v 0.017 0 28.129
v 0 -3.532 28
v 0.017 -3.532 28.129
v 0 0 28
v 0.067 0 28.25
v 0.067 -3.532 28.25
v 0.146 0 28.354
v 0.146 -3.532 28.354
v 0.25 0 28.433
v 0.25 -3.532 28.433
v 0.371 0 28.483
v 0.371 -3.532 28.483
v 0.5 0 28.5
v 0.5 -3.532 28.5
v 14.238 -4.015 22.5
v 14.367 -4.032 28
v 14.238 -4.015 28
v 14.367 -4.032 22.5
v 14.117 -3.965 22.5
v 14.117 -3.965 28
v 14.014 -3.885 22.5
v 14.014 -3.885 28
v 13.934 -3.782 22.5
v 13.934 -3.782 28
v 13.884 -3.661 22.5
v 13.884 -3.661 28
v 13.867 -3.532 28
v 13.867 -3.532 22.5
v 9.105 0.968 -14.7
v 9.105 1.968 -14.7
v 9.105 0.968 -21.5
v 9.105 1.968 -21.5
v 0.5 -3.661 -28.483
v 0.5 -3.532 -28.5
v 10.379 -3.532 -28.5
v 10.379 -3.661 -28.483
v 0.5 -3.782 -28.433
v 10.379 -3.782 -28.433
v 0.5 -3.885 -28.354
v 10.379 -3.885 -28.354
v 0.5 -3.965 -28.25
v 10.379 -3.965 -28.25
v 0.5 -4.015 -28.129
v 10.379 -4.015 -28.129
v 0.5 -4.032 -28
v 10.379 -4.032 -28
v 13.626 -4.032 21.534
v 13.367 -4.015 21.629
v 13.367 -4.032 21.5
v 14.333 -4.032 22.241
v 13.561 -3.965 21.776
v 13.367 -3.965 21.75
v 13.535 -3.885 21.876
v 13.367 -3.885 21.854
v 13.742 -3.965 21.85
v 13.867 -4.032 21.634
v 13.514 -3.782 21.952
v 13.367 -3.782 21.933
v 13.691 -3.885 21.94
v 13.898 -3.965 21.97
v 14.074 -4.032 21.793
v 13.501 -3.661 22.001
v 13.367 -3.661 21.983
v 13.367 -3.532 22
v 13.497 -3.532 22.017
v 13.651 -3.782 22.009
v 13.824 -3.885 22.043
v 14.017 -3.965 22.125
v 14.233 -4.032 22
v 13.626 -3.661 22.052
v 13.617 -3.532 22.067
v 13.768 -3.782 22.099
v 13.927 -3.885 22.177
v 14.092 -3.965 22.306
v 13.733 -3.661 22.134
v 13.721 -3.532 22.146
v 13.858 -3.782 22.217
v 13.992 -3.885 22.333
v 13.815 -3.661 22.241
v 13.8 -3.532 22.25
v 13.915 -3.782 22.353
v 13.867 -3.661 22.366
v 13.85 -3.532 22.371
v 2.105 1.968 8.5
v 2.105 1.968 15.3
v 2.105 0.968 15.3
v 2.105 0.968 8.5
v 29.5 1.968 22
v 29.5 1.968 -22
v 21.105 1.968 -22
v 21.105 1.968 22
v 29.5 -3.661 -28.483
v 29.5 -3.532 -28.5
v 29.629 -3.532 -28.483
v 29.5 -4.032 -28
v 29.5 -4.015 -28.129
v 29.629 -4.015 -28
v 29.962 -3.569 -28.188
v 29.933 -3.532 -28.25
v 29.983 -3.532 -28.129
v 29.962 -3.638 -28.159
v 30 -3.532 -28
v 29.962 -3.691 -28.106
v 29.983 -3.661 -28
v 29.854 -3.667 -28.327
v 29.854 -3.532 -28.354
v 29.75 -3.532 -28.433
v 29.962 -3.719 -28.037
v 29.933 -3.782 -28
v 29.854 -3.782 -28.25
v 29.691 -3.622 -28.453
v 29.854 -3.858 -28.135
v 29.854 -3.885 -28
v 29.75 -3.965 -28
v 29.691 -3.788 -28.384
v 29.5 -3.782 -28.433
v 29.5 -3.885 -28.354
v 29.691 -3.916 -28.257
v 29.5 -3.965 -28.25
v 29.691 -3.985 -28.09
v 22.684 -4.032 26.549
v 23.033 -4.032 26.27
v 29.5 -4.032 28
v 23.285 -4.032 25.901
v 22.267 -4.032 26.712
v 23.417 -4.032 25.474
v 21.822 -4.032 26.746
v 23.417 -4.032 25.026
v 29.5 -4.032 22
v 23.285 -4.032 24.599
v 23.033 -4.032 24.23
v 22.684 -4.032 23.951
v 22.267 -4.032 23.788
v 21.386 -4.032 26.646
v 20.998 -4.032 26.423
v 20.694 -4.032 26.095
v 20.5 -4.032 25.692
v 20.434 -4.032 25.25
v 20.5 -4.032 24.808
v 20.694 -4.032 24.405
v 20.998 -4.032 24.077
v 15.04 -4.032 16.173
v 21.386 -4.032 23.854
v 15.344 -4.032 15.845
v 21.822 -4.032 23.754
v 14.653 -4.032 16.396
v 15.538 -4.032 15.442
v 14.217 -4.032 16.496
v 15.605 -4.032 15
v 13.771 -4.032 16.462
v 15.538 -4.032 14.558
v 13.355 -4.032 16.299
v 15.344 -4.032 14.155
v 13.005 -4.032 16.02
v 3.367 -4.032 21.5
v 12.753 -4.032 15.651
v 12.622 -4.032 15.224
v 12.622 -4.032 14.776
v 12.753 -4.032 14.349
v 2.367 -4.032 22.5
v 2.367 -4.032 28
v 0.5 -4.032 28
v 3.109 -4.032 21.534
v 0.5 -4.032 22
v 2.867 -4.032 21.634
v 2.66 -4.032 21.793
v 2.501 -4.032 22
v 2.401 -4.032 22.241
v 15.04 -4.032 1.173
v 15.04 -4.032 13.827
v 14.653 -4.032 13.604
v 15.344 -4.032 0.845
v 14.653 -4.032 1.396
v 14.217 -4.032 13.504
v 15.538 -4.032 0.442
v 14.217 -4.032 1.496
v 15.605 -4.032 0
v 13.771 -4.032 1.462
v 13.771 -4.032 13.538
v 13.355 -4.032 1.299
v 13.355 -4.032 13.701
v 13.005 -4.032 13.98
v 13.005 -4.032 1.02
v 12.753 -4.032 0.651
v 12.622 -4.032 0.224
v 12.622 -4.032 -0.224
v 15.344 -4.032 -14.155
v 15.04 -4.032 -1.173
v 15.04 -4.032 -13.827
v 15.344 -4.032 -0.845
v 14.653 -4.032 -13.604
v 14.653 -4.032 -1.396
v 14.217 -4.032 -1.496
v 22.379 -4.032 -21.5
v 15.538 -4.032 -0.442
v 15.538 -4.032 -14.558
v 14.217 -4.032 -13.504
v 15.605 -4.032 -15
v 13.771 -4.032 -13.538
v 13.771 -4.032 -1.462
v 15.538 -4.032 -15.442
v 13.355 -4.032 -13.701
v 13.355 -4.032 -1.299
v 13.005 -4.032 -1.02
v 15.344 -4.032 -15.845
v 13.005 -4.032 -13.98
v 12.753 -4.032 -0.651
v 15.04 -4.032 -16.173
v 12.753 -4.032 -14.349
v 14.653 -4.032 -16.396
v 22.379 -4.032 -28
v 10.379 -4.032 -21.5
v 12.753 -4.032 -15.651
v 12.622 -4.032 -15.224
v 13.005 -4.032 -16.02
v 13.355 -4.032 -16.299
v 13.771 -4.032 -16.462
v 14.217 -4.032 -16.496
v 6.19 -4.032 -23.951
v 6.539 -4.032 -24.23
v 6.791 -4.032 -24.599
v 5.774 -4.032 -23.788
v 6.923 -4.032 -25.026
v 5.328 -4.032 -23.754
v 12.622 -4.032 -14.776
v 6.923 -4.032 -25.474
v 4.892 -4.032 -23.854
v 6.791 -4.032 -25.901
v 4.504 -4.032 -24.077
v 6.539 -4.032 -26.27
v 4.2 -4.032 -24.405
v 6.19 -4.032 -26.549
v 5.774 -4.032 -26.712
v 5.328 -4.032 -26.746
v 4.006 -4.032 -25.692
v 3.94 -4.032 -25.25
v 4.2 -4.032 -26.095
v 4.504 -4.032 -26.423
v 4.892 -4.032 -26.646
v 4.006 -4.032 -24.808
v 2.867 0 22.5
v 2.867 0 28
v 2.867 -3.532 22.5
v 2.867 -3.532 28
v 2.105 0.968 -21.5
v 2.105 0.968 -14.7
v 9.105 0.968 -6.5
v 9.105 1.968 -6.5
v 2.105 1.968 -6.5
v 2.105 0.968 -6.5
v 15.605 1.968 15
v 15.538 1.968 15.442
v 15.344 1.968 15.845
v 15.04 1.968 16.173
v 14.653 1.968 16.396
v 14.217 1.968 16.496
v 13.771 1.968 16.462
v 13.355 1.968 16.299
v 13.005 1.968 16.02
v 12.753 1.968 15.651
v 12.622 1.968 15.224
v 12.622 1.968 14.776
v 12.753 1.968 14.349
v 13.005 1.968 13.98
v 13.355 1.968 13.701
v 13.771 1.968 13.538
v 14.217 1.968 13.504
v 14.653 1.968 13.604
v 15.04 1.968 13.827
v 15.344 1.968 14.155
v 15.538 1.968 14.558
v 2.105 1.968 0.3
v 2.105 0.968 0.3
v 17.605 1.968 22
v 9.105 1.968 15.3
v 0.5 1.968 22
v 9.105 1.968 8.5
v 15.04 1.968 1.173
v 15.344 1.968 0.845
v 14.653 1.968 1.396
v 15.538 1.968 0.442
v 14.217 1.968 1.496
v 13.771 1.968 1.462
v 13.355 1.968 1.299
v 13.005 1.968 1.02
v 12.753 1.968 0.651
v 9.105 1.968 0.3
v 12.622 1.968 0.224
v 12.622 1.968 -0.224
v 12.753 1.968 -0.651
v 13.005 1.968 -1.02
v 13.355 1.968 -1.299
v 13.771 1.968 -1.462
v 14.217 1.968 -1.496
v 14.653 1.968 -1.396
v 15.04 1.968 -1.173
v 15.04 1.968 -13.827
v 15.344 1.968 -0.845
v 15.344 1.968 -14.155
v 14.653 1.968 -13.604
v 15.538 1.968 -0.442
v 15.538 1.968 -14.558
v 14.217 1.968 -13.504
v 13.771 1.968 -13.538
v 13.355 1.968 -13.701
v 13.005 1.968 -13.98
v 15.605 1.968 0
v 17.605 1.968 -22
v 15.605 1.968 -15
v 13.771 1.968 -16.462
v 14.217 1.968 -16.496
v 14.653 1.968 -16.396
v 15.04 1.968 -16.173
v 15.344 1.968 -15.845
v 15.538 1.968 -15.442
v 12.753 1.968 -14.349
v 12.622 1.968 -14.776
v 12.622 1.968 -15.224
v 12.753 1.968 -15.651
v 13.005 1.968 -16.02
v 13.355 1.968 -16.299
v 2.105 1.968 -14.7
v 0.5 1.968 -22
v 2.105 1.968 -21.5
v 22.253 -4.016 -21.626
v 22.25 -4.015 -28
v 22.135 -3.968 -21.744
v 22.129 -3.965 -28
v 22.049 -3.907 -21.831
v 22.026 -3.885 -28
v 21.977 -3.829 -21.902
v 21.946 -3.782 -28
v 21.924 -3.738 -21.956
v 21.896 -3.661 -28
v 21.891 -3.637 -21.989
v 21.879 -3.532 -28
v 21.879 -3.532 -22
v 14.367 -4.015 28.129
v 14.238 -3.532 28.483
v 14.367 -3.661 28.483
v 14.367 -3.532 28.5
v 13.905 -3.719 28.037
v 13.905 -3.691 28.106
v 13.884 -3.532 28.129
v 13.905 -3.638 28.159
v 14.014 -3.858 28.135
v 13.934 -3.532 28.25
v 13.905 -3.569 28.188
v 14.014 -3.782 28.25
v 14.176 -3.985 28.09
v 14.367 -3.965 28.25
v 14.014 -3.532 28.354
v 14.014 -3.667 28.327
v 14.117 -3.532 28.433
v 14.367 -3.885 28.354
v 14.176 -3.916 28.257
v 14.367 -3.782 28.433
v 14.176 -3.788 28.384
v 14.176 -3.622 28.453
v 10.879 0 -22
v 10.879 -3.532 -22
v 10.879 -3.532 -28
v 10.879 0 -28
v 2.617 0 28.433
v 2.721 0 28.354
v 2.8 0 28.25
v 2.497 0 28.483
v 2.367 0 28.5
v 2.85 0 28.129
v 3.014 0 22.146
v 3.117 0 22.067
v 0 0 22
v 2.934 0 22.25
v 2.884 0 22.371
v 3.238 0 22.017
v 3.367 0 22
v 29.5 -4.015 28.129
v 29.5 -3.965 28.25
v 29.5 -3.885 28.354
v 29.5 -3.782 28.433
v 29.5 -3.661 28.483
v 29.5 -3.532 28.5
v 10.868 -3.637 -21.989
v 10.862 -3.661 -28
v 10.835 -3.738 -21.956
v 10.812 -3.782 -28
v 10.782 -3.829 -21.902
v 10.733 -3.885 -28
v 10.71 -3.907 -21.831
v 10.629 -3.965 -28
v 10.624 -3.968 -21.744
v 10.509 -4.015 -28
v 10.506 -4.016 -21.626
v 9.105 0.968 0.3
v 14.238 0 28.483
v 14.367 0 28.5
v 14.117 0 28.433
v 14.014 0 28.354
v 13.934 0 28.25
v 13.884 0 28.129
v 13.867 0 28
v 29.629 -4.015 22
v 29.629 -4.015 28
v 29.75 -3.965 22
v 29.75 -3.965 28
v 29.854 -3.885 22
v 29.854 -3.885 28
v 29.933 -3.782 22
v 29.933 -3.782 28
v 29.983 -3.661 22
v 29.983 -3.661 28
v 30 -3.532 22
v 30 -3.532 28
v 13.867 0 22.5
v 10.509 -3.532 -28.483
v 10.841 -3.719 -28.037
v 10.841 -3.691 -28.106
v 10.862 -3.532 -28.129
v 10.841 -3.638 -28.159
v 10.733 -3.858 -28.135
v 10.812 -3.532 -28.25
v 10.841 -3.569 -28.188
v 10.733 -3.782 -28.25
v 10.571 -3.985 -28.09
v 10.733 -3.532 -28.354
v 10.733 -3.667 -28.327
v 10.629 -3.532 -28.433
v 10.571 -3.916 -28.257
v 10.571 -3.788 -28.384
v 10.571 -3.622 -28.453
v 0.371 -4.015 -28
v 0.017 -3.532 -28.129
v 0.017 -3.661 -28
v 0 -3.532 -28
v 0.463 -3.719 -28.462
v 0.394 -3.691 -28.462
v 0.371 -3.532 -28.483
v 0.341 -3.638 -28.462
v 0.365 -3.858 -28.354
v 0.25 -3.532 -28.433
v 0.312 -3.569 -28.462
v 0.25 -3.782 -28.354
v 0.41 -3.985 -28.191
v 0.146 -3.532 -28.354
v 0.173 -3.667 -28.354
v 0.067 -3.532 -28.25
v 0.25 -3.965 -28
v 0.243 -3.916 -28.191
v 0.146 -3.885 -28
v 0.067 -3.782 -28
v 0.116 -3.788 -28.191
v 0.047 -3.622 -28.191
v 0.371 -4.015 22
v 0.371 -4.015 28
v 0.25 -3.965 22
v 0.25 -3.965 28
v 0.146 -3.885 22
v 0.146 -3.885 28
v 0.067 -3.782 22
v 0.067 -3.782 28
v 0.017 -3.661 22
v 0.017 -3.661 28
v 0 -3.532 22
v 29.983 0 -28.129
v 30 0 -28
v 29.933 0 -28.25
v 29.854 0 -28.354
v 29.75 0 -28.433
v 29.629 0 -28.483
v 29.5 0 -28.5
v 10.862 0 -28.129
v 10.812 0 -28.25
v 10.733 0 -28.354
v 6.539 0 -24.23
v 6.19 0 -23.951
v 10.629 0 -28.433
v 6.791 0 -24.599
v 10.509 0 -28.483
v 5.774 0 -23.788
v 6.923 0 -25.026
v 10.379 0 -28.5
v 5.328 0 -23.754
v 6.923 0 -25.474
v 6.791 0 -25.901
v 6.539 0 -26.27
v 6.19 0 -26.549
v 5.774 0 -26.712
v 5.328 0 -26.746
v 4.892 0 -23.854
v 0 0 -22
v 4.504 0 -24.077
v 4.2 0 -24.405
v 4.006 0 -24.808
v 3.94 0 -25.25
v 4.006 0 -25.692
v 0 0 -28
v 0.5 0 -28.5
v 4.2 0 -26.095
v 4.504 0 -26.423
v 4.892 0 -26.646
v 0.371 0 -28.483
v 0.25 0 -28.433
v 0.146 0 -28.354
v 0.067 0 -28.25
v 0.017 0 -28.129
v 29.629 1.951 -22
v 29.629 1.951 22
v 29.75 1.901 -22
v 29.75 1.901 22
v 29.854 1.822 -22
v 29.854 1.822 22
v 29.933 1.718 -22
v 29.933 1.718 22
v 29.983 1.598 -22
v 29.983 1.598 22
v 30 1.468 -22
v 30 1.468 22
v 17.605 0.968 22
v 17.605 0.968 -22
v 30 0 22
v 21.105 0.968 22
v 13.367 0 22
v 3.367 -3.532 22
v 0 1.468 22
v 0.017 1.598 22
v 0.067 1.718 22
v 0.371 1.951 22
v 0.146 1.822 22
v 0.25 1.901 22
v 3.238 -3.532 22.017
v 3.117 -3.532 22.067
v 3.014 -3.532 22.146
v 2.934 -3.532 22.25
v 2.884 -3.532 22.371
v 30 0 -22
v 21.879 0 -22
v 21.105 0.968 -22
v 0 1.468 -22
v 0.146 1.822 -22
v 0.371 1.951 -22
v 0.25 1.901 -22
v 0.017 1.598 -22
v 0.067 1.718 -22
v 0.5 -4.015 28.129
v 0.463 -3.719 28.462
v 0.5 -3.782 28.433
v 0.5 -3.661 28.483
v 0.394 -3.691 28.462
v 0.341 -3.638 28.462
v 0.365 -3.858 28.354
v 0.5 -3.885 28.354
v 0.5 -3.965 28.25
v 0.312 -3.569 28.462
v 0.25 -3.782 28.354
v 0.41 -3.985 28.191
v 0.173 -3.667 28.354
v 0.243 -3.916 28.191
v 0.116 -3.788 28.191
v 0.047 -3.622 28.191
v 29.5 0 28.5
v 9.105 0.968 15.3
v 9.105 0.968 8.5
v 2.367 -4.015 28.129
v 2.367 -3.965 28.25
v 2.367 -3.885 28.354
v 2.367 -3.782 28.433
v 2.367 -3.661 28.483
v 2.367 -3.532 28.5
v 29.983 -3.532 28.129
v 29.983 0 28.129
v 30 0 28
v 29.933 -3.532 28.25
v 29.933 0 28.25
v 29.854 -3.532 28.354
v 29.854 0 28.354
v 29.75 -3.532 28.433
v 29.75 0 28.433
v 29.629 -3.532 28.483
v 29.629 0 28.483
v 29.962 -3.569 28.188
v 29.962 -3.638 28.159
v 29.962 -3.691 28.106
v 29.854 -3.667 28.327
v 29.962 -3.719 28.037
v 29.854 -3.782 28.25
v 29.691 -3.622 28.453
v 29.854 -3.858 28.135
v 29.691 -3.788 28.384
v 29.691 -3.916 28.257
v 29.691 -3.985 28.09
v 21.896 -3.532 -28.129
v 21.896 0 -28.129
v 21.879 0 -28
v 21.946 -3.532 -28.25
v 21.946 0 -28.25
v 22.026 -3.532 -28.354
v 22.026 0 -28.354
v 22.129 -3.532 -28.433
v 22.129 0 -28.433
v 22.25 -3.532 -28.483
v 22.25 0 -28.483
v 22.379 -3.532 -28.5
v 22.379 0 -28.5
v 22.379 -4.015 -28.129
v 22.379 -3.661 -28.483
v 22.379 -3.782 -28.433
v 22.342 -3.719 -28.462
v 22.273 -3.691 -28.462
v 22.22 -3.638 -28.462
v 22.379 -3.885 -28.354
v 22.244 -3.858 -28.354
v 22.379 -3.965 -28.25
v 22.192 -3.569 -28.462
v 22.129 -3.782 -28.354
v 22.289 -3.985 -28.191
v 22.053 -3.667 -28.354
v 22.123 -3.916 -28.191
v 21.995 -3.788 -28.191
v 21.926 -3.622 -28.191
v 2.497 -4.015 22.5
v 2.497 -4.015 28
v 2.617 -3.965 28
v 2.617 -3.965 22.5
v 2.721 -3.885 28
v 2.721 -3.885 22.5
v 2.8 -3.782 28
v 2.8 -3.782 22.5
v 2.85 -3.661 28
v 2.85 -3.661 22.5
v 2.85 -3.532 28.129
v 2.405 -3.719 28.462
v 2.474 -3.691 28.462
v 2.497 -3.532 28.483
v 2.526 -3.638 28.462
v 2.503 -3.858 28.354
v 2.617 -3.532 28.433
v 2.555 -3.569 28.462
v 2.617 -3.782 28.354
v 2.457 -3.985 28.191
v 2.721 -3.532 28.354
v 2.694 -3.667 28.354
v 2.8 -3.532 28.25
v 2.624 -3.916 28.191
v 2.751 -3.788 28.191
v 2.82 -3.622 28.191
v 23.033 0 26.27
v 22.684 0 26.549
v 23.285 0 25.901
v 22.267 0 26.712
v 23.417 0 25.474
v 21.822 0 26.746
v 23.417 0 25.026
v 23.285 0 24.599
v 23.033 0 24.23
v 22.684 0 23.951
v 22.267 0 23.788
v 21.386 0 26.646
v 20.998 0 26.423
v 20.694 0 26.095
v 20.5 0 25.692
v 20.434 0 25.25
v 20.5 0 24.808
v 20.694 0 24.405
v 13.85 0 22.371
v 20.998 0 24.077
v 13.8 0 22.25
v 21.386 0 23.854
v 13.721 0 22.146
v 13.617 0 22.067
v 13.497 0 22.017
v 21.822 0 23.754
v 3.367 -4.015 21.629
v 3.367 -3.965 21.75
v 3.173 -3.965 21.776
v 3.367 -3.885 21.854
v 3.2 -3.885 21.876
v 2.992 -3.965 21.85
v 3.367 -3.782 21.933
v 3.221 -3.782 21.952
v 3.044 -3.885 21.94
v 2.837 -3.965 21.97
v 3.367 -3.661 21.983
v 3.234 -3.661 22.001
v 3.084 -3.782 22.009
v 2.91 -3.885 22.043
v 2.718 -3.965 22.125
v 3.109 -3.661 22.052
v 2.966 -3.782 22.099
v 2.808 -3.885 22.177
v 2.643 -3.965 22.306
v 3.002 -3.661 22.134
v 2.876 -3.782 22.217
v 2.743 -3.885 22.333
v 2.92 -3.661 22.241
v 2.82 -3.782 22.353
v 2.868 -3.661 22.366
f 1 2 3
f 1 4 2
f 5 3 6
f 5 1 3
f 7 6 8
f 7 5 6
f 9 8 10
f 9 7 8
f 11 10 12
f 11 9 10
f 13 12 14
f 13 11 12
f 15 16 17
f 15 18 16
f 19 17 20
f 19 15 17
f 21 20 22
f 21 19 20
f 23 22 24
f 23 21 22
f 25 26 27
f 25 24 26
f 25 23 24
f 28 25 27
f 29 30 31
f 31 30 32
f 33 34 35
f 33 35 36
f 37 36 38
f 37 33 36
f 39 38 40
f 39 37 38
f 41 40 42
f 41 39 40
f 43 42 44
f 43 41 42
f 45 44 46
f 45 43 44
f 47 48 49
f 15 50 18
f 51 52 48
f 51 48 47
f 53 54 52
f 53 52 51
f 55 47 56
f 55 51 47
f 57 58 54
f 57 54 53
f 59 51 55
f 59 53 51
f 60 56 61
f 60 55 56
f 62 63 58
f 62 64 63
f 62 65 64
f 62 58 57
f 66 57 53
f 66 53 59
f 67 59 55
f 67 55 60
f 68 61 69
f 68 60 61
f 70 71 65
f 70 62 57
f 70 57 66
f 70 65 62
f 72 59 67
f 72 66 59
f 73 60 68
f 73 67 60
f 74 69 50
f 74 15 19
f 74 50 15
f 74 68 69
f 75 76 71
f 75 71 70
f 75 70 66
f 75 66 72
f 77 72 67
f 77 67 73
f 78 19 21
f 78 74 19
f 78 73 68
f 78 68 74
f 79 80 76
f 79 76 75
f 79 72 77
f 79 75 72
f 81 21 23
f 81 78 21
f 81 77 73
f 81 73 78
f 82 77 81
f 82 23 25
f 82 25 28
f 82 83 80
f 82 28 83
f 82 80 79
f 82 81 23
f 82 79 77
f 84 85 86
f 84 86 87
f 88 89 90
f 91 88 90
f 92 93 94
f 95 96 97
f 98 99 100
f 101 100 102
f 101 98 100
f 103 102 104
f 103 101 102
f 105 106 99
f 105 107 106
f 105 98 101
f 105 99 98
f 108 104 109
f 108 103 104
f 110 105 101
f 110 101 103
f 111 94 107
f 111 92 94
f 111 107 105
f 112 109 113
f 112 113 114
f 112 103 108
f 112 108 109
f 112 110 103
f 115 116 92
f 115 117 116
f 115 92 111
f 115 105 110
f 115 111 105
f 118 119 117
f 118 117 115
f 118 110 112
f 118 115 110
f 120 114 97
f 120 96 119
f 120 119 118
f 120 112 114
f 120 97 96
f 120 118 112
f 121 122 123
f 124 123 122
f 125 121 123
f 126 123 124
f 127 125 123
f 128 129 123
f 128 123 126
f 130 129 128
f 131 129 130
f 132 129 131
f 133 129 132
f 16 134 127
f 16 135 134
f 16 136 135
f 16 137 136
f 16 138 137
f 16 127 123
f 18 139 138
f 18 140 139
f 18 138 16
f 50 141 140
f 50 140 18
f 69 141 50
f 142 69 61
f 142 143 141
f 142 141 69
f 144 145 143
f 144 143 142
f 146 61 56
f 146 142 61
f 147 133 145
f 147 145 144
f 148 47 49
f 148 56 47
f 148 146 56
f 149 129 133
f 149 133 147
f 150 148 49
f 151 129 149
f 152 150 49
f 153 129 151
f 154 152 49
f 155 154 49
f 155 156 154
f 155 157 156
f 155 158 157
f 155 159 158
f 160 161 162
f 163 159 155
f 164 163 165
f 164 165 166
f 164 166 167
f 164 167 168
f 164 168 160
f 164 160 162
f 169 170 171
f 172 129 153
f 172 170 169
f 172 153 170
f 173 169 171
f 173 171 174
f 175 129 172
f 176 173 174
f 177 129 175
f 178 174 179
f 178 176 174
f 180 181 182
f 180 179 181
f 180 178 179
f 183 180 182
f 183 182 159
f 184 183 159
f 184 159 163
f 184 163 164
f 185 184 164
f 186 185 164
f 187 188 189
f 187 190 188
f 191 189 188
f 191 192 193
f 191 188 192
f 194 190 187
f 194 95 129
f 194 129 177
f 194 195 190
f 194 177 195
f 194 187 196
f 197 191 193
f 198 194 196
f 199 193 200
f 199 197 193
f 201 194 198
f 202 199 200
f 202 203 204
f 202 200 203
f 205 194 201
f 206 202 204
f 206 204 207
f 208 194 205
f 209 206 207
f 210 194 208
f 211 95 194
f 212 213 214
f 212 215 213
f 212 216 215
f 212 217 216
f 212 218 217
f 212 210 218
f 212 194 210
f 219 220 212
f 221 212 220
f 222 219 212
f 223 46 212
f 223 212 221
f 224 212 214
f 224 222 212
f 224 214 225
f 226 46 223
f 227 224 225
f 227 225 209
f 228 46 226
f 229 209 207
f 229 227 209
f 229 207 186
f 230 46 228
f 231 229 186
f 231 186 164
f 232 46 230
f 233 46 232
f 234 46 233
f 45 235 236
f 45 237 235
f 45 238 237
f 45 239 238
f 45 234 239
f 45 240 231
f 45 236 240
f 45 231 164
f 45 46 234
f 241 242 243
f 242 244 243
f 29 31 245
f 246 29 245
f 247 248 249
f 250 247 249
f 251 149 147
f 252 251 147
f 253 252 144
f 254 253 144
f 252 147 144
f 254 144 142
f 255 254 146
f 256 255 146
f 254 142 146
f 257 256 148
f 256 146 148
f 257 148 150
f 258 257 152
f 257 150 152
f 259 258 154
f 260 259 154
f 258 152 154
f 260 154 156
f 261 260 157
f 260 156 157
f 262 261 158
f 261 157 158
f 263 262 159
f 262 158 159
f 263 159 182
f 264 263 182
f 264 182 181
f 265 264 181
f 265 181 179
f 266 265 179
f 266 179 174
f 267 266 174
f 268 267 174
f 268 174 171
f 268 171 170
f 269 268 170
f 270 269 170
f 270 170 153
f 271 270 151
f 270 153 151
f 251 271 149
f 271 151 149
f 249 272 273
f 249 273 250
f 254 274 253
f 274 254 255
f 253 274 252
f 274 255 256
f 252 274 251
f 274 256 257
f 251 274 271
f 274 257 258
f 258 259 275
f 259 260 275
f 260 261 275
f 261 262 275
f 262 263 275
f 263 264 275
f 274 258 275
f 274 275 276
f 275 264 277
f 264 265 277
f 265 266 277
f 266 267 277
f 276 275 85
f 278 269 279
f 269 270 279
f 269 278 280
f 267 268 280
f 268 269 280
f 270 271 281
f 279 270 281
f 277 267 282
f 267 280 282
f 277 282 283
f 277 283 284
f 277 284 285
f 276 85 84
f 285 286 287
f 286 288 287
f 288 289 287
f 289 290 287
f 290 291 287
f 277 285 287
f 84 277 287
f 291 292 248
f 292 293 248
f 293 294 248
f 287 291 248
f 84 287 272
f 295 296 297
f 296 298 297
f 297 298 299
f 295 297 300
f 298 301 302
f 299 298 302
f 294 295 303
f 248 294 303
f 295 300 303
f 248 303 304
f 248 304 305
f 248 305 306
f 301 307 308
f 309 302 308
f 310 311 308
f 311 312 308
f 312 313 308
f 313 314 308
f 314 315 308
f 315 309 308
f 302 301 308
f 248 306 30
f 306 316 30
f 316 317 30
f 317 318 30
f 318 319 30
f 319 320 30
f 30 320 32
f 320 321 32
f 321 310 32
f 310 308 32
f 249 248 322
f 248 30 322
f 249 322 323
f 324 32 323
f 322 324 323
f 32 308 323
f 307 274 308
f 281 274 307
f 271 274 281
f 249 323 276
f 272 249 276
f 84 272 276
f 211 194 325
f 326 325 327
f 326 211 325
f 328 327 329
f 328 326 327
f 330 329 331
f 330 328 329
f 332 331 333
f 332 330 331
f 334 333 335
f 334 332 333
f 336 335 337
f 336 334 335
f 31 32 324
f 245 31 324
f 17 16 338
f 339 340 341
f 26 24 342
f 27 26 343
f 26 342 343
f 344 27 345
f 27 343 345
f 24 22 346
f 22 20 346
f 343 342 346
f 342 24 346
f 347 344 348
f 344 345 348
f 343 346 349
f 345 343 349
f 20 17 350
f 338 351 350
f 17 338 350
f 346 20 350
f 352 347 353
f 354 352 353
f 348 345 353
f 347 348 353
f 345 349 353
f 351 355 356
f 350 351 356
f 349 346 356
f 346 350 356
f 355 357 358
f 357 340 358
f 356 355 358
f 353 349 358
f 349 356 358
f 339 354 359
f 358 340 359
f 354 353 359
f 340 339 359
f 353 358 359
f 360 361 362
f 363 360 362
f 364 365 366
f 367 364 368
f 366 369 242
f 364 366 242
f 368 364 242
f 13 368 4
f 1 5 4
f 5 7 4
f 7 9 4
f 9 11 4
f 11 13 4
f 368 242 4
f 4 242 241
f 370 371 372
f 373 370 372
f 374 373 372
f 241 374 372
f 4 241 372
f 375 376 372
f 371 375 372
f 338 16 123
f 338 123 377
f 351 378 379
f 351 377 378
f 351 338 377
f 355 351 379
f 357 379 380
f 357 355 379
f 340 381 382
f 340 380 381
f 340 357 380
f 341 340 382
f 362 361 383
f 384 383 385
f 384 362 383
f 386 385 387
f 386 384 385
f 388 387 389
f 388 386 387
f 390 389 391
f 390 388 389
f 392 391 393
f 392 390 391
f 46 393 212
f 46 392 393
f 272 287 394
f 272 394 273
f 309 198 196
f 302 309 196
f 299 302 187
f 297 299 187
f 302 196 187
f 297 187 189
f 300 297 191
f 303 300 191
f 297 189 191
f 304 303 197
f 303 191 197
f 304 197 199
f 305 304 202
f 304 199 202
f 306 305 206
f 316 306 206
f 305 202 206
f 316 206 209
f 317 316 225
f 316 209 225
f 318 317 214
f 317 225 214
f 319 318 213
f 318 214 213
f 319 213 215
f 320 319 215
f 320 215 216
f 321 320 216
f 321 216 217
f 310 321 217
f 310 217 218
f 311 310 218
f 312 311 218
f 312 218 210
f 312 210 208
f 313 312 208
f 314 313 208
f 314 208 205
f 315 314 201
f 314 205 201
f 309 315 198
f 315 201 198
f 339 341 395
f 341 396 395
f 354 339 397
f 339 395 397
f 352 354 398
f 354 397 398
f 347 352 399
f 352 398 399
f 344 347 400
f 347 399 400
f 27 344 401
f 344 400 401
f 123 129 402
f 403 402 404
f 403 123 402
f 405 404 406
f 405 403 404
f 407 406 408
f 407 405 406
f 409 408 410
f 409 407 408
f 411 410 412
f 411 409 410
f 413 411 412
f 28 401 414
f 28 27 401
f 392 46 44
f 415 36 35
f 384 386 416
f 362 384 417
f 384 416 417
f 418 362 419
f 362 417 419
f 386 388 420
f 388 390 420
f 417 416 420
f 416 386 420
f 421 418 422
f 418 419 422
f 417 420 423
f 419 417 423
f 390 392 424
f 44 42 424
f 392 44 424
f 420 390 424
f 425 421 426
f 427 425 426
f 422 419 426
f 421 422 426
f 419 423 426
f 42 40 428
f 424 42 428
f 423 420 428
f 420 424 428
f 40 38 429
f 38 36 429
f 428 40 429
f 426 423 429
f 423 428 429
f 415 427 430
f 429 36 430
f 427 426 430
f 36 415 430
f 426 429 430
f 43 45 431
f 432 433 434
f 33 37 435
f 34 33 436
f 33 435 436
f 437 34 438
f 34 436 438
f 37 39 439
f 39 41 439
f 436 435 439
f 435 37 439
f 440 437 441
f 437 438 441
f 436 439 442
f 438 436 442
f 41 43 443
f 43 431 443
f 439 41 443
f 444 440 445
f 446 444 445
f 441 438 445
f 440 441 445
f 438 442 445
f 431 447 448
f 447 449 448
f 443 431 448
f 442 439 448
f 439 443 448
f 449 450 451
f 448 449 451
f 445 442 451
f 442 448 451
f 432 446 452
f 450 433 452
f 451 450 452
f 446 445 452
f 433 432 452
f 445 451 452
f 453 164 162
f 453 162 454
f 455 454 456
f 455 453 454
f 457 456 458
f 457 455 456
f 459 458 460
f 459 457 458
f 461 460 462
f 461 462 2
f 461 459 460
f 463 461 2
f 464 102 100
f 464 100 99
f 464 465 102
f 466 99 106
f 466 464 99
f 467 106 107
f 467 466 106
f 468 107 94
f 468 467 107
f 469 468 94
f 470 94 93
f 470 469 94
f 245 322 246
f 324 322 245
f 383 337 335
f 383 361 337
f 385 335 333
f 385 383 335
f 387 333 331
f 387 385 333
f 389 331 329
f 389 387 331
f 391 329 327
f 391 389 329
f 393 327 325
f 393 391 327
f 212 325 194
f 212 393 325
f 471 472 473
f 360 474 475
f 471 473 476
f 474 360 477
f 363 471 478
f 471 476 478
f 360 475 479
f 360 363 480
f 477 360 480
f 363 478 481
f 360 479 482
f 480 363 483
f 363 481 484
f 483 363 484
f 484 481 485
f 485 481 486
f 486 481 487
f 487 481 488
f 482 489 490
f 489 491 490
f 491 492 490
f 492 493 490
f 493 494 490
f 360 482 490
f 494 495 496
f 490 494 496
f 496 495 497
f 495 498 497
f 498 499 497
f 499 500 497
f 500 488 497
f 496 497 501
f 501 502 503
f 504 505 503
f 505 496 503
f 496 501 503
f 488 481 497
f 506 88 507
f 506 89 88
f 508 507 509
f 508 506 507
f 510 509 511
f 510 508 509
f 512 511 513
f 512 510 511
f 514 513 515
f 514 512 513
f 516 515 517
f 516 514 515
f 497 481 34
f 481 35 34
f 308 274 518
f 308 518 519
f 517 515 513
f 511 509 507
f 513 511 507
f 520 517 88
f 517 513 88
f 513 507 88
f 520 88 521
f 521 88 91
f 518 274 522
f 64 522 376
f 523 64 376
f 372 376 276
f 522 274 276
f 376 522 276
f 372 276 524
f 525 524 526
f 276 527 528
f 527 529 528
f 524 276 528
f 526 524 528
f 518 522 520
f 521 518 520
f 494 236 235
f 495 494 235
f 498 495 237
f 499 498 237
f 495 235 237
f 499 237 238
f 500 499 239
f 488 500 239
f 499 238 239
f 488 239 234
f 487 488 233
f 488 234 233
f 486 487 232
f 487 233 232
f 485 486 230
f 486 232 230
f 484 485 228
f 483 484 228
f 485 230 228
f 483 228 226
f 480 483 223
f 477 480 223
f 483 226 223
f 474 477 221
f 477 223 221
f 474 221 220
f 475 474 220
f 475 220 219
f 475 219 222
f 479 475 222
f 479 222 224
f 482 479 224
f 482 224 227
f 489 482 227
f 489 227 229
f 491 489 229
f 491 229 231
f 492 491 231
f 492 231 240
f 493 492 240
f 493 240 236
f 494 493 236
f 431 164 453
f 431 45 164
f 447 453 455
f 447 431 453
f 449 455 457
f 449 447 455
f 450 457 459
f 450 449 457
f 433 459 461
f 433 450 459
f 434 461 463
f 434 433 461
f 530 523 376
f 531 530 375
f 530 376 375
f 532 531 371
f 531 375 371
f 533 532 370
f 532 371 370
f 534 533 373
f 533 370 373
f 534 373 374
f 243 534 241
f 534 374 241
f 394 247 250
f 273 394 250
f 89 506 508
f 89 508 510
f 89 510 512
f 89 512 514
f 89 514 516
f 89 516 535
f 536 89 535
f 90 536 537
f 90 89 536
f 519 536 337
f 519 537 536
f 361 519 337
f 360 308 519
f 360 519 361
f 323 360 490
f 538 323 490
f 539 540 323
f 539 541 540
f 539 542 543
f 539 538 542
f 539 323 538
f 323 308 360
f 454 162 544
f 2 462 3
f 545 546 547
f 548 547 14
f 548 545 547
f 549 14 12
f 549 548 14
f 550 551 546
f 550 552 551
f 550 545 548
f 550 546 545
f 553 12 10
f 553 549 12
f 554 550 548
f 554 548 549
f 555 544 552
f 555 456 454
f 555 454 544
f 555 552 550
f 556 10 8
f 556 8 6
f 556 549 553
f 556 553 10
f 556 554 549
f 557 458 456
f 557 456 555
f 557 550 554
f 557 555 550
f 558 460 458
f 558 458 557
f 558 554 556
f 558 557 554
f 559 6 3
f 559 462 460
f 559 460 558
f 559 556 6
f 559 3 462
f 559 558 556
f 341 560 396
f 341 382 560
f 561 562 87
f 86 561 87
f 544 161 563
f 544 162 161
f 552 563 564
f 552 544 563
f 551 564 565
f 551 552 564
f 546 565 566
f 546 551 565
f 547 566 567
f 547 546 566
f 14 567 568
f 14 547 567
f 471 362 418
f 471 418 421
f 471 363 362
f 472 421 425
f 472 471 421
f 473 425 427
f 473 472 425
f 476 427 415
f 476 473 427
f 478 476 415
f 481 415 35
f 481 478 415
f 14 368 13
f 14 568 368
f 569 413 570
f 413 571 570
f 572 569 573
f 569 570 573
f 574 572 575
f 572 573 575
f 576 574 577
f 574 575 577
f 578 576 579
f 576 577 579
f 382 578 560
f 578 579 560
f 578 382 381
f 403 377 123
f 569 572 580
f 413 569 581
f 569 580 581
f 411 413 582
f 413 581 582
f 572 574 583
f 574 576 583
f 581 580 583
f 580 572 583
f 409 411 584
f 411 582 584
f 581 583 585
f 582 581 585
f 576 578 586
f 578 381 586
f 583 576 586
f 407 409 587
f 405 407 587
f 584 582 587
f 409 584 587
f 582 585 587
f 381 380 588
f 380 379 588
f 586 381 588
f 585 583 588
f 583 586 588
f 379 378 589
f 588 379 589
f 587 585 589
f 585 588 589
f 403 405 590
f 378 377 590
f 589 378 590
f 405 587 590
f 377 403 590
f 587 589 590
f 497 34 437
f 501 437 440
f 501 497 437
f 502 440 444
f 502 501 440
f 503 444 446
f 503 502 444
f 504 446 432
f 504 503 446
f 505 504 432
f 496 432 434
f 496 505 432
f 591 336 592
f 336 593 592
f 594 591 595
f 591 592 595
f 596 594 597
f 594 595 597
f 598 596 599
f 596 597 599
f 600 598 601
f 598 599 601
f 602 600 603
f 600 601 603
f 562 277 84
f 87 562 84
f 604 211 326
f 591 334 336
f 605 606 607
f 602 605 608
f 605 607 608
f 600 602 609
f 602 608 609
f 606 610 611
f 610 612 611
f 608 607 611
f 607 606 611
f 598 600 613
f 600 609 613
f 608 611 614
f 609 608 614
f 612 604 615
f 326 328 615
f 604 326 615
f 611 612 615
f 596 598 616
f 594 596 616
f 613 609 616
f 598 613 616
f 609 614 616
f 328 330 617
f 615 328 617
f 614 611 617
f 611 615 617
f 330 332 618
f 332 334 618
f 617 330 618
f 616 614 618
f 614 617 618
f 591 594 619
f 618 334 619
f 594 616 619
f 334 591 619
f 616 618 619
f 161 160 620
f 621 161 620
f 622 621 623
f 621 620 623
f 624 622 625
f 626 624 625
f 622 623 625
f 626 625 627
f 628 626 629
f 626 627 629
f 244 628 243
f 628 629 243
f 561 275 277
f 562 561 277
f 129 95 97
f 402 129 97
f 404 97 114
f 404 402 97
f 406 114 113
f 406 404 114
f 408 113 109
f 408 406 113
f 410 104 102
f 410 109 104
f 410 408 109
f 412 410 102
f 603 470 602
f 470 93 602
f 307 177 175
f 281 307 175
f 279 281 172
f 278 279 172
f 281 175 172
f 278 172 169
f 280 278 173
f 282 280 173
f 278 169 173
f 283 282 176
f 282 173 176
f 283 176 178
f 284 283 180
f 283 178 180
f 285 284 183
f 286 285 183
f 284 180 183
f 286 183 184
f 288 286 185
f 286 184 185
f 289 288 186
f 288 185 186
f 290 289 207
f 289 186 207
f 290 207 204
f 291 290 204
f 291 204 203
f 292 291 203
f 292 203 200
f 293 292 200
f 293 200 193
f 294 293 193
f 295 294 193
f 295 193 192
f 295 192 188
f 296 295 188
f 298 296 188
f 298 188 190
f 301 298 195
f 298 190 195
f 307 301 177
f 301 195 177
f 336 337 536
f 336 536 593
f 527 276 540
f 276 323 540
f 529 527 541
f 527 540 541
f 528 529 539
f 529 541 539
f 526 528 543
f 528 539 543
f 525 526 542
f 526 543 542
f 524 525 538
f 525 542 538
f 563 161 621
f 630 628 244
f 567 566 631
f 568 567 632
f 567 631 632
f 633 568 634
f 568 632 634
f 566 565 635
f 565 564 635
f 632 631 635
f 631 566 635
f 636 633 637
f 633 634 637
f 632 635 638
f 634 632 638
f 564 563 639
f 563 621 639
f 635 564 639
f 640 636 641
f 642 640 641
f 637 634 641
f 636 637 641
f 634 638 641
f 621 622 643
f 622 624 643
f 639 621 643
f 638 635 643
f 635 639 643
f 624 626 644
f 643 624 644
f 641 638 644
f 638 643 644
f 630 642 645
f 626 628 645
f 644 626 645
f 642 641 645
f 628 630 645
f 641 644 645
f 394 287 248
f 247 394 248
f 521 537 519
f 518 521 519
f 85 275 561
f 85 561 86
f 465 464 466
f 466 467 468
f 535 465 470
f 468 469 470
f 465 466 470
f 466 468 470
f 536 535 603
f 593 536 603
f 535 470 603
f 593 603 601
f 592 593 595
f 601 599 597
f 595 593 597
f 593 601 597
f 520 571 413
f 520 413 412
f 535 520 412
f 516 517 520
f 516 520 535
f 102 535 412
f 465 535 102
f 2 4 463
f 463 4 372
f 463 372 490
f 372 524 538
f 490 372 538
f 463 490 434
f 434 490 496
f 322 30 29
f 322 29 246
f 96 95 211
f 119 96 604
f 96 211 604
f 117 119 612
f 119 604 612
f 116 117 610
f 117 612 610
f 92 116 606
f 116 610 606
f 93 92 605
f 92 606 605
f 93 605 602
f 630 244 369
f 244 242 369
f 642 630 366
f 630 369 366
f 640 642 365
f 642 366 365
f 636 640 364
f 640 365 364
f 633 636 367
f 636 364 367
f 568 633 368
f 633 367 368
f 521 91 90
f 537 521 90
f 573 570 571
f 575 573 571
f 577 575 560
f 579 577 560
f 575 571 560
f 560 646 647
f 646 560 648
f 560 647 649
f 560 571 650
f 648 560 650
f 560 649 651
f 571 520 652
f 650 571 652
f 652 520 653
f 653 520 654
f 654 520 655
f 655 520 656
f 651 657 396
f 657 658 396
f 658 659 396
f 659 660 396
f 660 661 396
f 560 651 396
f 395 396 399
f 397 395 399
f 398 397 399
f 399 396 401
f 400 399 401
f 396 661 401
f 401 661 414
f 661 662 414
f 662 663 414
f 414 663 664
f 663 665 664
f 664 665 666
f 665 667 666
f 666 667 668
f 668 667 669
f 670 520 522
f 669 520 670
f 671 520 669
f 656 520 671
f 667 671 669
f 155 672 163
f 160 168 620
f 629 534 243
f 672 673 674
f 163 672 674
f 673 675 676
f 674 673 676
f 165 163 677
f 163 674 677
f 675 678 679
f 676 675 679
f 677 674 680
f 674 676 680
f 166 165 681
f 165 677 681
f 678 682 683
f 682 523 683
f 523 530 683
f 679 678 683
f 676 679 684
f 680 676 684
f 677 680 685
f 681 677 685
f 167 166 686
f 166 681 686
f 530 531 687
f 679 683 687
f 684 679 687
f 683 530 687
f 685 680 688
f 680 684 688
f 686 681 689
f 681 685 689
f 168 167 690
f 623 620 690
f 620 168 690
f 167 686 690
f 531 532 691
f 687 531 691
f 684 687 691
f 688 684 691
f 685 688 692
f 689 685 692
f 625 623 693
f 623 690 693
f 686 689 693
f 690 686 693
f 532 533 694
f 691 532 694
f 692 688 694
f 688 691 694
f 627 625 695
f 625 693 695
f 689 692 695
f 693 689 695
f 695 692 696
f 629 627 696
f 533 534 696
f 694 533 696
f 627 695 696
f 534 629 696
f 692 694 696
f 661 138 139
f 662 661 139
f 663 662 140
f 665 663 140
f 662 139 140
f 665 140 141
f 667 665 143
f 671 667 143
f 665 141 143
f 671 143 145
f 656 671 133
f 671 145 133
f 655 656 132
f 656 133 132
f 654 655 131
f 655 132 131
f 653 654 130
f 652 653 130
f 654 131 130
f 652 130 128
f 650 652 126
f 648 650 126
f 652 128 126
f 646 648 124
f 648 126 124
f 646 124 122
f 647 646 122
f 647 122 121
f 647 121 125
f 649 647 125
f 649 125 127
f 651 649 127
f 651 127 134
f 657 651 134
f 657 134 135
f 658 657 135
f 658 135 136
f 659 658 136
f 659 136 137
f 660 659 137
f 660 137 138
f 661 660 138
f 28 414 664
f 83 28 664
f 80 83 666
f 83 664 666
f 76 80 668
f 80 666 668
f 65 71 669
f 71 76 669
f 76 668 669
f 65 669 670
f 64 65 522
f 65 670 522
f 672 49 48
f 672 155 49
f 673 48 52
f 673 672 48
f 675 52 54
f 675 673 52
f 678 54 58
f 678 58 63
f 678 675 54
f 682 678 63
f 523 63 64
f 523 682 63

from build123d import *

# Parameters (mm, degrees)
SKETCH2_W           = 30
SKETCH2_H           = 44
BOSS_EXTRUDE1_DEPTH = 6
SKETCH4_W           = 10.879446424
SKETCH4_H           = 6.5
SKETCH4_W_2         = 8.120553576
SKETCH4_W_3         = 2.867356219
SKETCH4_W_4         = 16.132643781
BOSS_EXTRUDE2_DEPTH = 4.03177
SKETCH3_W           = 3.5
SKETCH3_H           = 44
SKETCH3_W_2         = 7
SKETCH3_H_2         = 6.8
CUT_EXTRUDE3_DEPTH  = 1
FILLET1_R           = 0.5
CUT_EXTRUDE4_REACH  = 8
SKETCH5_R           = 1.5
SKETCH6_R           = 1.5
CUT_EXTRUDE5_DEPTH  = 6


with BuildPart() as part:
    # Sketch2 → Boss-Extrude1 (new body)
    with BuildSketch(Plane(origin=(0, 1.96823021, 0), x_dir=(-1, 0, 0), z_dir=(0, -1, 0))):
        with Locations((-15, 0)):
            Rectangle(SKETCH2_W, SKETCH2_H)
    extrude(amount=BOSS_EXTRUDE1_DEPTH)

    # Sketch4 → Boss-Extrude2 (add)
    with BuildSketch(Plane(origin=(0, -4.03176979, 0), x_dir=(-1, 0, 0), z_dir=(0, -1, 0))):
        with Locations((-5.439723212, 25.25)):
            Rectangle(SKETCH4_W, SKETCH4_H)
        with Locations((-25.939723212, 25.25)):
            Rectangle(SKETCH4_W_2, SKETCH4_H)
        with Locations((-1.43367811, -25.25)):
            Rectangle(SKETCH4_W_3, SKETCH4_H)
        with Locations((-21.93367811, -25.25)):
            Rectangle(SKETCH4_W_4, SKETCH4_H)
    extrude(amount=-BOSS_EXTRUDE2_DEPTH)

    # Sketch3 → Cut-Extrude3 (cut)
    with BuildSketch(Plane(origin=(0, 1.96823021, 0), x_dir=(-1, 0, 0), z_dir=(0, -1, 0))):
        with Locations((-19.354808617, 0)):
            Rectangle(SKETCH3_W, SKETCH3_H)
        with Locations((-5.604808617, 3.1)):
            Rectangle(SKETCH3_W_2, SKETCH3_H_2)
        with Locations((-5.604808617, -11.9)):
            Rectangle(SKETCH3_W_2, SKETCH3_H_2)
        with Locations((-5.604808617, 18.1)):
            Rectangle(SKETCH3_W_2, SKETCH3_H_2)
    extrude(amount=CUT_EXTRUDE3_DEPTH, mode=Mode.SUBTRACT)

    # Fillet1
    fillet1_edges = [part.edges().sort_by_distance(p)[0] for p in [
        (0, -4.03176979, 0),
        (16.379446424, -4.03176979, -22),
        (5.439723212, -4.03176979, -28.5),
        (10.879446424, -4.03176979, -25.25),
        (10.879446424, -2.01588479, -28.5),
        (0, -2.01588479, -28.5),
        (21.879446424, -4.03176979, -25.25),
        (25.939723212, -4.03176979, -28.5),
        (21.879446424, -2.01588479, -28.5),
        (30, -2.01588479, -28.5),
        (2.867356219, -4.03176979, 25.25),
        (1.433678109, -4.03176979, 28.5),
        (2.867356219, -2.01588479, 22),
        (2.867356219, -2.01588479, 28.5),
        (0, -2.01588479, 28.5),
        (8.367356219, -4.03176979, 22),
        (21.933678109, -4.03176979, 28.5),
        (13.867356219, -4.03176979, 25.25),
        (13.867356219, -2.01588479, 28.5),
        (13.867356219, -2.01588479, 22),
        (30, -2.01588479, 28.5),
        (30, -4.03176979, 0),
        (0, 1.96823021, 0),
        (30, 1.96823021, 0),
    ]]
    fillet(fillet1_edges, radius=FILLET1_R)

    # Sketch5 → Cut-Extrude4 (cut, up to next)
    with BuildSketch(Plane(origin=(0, -4.03176979, 0), x_dir=(-1, 0, 0), z_dir=(0, -1, 0)), mode=Mode.PRIVATE) as cut_extrude4_sk1:
        with Locations((-5.439723212, 25.25)):
            Circle(SKETCH5_R)
    cut_extrude4_tool1 = extrude(cut_extrude4_sk1.sketch, amount=-CUT_EXTRUDE4_REACH, mode=Mode.PRIVATE) & part.part
    add(cut_extrude4_tool1.solids().sort_by_distance((5.439723, -4.03177, -25.25))[0], mode=Mode.SUBTRACT)
    # Sketch5 → Cut-Extrude4 (cut, up to next)
    with BuildSketch(Plane(origin=(0, -4.03176979, 0), x_dir=(-1, 0, 0), z_dir=(0, -1, 0)), mode=Mode.PRIVATE) as cut_extrude4_sk2:
        with Locations((-21.933678109, -25.25)):
            Circle(SKETCH5_R)
    cut_extrude4_tool2 = extrude(cut_extrude4_sk2.sketch, amount=-CUT_EXTRUDE4_REACH, mode=Mode.PRIVATE) & part.part
    add(cut_extrude4_tool2.solids().sort_by_distance((21.933678, -4.03177, 25.25))[0], mode=Mode.SUBTRACT)

    # Sketch6 → Cut-Extrude5 (cut)
    with BuildSketch(Plane.XZ.offset(4.03176979)):
        with Locations((14.104808617, -15)):
            Circle(SKETCH6_R)
        with Locations((14.104808617, 0)):
            Circle(SKETCH6_R)
        with Locations((14.104808617, 15)):
            Circle(SKETCH6_R)
    extrude(amount=-CUT_EXTRUDE5_DEPTH, mode=Mode.SUBTRACT)


solid = part.part
